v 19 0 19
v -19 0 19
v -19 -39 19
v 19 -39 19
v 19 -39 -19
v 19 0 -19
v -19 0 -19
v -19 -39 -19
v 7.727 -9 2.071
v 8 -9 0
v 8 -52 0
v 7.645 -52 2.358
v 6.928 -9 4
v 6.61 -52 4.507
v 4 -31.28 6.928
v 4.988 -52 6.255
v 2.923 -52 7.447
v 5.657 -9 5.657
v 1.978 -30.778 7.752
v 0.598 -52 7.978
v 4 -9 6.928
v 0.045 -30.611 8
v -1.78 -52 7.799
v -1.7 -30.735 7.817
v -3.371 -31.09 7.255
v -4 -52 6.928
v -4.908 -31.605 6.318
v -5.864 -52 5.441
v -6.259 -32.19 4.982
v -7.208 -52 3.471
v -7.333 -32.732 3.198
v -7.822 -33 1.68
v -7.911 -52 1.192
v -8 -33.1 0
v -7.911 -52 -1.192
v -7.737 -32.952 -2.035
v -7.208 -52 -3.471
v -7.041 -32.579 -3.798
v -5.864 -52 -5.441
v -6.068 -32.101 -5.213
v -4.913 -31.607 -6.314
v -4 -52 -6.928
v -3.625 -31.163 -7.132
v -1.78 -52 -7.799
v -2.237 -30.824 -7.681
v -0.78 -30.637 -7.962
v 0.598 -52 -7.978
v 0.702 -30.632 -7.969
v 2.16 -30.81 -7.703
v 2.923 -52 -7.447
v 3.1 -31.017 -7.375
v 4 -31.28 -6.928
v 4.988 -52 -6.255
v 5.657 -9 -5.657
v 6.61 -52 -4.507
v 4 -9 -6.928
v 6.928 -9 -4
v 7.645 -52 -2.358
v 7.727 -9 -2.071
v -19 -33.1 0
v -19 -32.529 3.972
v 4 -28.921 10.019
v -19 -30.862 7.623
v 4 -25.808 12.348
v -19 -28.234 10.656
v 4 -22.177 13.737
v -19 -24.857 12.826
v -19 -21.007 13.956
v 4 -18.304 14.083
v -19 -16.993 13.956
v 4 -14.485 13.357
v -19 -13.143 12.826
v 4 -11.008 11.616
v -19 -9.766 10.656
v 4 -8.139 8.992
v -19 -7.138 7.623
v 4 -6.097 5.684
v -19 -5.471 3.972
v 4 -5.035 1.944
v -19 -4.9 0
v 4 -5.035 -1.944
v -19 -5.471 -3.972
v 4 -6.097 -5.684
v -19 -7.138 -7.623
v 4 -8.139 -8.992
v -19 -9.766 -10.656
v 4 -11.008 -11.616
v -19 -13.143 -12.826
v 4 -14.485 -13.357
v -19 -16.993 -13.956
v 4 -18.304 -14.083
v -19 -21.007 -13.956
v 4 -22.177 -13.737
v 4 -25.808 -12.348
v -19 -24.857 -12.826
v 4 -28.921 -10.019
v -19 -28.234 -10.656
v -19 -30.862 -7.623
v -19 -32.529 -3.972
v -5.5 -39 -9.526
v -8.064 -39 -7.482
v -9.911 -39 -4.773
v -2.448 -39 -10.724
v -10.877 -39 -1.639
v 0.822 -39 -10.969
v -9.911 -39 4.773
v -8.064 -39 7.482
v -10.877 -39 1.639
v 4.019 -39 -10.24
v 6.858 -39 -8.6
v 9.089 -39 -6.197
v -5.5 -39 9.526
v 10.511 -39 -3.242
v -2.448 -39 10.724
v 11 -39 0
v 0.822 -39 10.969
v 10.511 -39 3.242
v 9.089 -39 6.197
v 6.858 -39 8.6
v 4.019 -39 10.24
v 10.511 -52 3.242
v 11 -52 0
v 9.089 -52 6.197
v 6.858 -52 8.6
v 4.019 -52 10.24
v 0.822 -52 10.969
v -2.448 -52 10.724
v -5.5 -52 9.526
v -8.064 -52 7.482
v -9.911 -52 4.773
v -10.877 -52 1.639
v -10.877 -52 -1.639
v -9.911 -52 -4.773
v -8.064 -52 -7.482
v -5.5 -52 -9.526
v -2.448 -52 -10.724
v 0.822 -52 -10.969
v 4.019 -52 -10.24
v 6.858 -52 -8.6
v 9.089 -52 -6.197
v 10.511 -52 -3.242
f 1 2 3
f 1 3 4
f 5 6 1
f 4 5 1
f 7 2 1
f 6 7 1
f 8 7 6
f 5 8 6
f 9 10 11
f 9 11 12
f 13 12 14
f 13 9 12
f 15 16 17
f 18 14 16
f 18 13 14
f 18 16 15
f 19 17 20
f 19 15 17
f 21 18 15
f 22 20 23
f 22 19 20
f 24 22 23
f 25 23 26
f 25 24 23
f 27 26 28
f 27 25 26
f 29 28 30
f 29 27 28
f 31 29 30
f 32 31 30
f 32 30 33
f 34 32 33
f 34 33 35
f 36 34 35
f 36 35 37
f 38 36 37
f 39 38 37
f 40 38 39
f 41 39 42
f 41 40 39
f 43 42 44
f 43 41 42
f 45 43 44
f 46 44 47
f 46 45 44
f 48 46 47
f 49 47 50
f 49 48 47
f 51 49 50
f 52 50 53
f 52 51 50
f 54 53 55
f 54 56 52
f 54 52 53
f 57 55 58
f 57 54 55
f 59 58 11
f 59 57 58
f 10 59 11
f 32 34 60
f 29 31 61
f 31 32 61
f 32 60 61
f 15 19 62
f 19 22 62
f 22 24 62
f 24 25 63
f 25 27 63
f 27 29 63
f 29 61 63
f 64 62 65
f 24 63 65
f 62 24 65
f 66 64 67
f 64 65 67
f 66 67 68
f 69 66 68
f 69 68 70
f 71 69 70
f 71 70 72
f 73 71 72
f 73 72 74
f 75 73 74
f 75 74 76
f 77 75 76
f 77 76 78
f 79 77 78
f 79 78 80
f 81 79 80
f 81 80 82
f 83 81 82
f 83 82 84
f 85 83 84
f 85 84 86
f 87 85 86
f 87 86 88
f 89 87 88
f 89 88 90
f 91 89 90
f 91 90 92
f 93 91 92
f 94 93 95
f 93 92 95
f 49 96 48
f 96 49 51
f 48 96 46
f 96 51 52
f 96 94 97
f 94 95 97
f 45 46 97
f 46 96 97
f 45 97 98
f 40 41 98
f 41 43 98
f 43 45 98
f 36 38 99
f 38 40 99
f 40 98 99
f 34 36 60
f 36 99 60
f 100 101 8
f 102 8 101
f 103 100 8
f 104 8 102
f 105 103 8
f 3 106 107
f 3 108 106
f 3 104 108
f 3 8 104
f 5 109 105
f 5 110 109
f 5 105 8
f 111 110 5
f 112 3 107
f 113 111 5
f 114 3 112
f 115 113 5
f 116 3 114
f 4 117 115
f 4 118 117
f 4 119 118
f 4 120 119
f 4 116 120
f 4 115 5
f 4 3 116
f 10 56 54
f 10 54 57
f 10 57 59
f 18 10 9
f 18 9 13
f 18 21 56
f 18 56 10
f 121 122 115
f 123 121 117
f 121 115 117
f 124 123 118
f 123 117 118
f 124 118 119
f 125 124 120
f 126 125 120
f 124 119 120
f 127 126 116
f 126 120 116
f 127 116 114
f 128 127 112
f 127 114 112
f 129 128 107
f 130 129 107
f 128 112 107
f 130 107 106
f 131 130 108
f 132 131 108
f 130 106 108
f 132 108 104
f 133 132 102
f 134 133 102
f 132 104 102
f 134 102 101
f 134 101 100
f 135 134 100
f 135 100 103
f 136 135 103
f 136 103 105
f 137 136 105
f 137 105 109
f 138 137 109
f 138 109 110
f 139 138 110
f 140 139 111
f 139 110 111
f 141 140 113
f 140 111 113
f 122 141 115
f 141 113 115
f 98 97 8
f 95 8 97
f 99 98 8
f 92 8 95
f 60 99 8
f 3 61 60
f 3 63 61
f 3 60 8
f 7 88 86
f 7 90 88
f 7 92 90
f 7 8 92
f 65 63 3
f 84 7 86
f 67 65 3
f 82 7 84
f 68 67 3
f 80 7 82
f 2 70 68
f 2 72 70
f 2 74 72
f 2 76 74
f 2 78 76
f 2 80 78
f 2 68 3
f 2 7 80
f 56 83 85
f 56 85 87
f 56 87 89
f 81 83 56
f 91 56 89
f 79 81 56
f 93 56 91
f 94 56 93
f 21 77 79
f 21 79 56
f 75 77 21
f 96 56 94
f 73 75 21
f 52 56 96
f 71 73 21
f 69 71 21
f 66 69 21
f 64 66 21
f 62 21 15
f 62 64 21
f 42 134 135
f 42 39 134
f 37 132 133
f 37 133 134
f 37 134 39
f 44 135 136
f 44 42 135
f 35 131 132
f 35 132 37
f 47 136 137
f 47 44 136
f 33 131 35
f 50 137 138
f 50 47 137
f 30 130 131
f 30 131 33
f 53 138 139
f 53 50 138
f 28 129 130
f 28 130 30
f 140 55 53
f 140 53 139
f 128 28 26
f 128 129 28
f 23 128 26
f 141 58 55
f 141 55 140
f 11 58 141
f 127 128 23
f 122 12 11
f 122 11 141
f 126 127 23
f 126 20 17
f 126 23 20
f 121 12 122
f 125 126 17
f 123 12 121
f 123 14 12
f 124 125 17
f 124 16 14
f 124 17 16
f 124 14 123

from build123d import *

# Parameters (mm, degrees)
F0_W     = 38
F0_H     = 38
F1_DEPTH = 39
F2_R     = 11
F2_R_2   = 8
F3_DEPTH = 13
F4_R     = 8
F5_DEPTH = 30
F6_R     = 14.1
F7_DEPTH = 23


with BuildPart() as f1:
    # F0 (on Front) → F1 (new body)
    with BuildSketch(Plane.XZ):
        Rectangle(F0_W, F0_H)
    extrude(amount=F1_DEPTH)

    # F2 (on face) → F3 (join)
    with BuildSketch(Plane.XZ.offset(39)):
        Circle(F2_R)
        Circle(F2_R_2, mode=Mode.SUBTRACT)
    extrude(amount=F3_DEPTH)

    # F4 (on face) → F5 (cut)
    with BuildSketch(Plane.XZ.offset(39)):
        Circle(F4_R)
    extrude(amount=-F5_DEPTH, mode=Mode.SUBTRACT)

    # F6 (on face) → F7 (cut)
    with BuildSketch(Plane(origin=(-19, 0, 0), x_dir=(0, -1, 0), z_dir=(-1, 0, 0))):
        with Locations((19, 0)):
            Circle(F6_R)
    extrude(amount=-F7_DEPTH, mode=Mode.SUBTRACT)


solid = f1.part
